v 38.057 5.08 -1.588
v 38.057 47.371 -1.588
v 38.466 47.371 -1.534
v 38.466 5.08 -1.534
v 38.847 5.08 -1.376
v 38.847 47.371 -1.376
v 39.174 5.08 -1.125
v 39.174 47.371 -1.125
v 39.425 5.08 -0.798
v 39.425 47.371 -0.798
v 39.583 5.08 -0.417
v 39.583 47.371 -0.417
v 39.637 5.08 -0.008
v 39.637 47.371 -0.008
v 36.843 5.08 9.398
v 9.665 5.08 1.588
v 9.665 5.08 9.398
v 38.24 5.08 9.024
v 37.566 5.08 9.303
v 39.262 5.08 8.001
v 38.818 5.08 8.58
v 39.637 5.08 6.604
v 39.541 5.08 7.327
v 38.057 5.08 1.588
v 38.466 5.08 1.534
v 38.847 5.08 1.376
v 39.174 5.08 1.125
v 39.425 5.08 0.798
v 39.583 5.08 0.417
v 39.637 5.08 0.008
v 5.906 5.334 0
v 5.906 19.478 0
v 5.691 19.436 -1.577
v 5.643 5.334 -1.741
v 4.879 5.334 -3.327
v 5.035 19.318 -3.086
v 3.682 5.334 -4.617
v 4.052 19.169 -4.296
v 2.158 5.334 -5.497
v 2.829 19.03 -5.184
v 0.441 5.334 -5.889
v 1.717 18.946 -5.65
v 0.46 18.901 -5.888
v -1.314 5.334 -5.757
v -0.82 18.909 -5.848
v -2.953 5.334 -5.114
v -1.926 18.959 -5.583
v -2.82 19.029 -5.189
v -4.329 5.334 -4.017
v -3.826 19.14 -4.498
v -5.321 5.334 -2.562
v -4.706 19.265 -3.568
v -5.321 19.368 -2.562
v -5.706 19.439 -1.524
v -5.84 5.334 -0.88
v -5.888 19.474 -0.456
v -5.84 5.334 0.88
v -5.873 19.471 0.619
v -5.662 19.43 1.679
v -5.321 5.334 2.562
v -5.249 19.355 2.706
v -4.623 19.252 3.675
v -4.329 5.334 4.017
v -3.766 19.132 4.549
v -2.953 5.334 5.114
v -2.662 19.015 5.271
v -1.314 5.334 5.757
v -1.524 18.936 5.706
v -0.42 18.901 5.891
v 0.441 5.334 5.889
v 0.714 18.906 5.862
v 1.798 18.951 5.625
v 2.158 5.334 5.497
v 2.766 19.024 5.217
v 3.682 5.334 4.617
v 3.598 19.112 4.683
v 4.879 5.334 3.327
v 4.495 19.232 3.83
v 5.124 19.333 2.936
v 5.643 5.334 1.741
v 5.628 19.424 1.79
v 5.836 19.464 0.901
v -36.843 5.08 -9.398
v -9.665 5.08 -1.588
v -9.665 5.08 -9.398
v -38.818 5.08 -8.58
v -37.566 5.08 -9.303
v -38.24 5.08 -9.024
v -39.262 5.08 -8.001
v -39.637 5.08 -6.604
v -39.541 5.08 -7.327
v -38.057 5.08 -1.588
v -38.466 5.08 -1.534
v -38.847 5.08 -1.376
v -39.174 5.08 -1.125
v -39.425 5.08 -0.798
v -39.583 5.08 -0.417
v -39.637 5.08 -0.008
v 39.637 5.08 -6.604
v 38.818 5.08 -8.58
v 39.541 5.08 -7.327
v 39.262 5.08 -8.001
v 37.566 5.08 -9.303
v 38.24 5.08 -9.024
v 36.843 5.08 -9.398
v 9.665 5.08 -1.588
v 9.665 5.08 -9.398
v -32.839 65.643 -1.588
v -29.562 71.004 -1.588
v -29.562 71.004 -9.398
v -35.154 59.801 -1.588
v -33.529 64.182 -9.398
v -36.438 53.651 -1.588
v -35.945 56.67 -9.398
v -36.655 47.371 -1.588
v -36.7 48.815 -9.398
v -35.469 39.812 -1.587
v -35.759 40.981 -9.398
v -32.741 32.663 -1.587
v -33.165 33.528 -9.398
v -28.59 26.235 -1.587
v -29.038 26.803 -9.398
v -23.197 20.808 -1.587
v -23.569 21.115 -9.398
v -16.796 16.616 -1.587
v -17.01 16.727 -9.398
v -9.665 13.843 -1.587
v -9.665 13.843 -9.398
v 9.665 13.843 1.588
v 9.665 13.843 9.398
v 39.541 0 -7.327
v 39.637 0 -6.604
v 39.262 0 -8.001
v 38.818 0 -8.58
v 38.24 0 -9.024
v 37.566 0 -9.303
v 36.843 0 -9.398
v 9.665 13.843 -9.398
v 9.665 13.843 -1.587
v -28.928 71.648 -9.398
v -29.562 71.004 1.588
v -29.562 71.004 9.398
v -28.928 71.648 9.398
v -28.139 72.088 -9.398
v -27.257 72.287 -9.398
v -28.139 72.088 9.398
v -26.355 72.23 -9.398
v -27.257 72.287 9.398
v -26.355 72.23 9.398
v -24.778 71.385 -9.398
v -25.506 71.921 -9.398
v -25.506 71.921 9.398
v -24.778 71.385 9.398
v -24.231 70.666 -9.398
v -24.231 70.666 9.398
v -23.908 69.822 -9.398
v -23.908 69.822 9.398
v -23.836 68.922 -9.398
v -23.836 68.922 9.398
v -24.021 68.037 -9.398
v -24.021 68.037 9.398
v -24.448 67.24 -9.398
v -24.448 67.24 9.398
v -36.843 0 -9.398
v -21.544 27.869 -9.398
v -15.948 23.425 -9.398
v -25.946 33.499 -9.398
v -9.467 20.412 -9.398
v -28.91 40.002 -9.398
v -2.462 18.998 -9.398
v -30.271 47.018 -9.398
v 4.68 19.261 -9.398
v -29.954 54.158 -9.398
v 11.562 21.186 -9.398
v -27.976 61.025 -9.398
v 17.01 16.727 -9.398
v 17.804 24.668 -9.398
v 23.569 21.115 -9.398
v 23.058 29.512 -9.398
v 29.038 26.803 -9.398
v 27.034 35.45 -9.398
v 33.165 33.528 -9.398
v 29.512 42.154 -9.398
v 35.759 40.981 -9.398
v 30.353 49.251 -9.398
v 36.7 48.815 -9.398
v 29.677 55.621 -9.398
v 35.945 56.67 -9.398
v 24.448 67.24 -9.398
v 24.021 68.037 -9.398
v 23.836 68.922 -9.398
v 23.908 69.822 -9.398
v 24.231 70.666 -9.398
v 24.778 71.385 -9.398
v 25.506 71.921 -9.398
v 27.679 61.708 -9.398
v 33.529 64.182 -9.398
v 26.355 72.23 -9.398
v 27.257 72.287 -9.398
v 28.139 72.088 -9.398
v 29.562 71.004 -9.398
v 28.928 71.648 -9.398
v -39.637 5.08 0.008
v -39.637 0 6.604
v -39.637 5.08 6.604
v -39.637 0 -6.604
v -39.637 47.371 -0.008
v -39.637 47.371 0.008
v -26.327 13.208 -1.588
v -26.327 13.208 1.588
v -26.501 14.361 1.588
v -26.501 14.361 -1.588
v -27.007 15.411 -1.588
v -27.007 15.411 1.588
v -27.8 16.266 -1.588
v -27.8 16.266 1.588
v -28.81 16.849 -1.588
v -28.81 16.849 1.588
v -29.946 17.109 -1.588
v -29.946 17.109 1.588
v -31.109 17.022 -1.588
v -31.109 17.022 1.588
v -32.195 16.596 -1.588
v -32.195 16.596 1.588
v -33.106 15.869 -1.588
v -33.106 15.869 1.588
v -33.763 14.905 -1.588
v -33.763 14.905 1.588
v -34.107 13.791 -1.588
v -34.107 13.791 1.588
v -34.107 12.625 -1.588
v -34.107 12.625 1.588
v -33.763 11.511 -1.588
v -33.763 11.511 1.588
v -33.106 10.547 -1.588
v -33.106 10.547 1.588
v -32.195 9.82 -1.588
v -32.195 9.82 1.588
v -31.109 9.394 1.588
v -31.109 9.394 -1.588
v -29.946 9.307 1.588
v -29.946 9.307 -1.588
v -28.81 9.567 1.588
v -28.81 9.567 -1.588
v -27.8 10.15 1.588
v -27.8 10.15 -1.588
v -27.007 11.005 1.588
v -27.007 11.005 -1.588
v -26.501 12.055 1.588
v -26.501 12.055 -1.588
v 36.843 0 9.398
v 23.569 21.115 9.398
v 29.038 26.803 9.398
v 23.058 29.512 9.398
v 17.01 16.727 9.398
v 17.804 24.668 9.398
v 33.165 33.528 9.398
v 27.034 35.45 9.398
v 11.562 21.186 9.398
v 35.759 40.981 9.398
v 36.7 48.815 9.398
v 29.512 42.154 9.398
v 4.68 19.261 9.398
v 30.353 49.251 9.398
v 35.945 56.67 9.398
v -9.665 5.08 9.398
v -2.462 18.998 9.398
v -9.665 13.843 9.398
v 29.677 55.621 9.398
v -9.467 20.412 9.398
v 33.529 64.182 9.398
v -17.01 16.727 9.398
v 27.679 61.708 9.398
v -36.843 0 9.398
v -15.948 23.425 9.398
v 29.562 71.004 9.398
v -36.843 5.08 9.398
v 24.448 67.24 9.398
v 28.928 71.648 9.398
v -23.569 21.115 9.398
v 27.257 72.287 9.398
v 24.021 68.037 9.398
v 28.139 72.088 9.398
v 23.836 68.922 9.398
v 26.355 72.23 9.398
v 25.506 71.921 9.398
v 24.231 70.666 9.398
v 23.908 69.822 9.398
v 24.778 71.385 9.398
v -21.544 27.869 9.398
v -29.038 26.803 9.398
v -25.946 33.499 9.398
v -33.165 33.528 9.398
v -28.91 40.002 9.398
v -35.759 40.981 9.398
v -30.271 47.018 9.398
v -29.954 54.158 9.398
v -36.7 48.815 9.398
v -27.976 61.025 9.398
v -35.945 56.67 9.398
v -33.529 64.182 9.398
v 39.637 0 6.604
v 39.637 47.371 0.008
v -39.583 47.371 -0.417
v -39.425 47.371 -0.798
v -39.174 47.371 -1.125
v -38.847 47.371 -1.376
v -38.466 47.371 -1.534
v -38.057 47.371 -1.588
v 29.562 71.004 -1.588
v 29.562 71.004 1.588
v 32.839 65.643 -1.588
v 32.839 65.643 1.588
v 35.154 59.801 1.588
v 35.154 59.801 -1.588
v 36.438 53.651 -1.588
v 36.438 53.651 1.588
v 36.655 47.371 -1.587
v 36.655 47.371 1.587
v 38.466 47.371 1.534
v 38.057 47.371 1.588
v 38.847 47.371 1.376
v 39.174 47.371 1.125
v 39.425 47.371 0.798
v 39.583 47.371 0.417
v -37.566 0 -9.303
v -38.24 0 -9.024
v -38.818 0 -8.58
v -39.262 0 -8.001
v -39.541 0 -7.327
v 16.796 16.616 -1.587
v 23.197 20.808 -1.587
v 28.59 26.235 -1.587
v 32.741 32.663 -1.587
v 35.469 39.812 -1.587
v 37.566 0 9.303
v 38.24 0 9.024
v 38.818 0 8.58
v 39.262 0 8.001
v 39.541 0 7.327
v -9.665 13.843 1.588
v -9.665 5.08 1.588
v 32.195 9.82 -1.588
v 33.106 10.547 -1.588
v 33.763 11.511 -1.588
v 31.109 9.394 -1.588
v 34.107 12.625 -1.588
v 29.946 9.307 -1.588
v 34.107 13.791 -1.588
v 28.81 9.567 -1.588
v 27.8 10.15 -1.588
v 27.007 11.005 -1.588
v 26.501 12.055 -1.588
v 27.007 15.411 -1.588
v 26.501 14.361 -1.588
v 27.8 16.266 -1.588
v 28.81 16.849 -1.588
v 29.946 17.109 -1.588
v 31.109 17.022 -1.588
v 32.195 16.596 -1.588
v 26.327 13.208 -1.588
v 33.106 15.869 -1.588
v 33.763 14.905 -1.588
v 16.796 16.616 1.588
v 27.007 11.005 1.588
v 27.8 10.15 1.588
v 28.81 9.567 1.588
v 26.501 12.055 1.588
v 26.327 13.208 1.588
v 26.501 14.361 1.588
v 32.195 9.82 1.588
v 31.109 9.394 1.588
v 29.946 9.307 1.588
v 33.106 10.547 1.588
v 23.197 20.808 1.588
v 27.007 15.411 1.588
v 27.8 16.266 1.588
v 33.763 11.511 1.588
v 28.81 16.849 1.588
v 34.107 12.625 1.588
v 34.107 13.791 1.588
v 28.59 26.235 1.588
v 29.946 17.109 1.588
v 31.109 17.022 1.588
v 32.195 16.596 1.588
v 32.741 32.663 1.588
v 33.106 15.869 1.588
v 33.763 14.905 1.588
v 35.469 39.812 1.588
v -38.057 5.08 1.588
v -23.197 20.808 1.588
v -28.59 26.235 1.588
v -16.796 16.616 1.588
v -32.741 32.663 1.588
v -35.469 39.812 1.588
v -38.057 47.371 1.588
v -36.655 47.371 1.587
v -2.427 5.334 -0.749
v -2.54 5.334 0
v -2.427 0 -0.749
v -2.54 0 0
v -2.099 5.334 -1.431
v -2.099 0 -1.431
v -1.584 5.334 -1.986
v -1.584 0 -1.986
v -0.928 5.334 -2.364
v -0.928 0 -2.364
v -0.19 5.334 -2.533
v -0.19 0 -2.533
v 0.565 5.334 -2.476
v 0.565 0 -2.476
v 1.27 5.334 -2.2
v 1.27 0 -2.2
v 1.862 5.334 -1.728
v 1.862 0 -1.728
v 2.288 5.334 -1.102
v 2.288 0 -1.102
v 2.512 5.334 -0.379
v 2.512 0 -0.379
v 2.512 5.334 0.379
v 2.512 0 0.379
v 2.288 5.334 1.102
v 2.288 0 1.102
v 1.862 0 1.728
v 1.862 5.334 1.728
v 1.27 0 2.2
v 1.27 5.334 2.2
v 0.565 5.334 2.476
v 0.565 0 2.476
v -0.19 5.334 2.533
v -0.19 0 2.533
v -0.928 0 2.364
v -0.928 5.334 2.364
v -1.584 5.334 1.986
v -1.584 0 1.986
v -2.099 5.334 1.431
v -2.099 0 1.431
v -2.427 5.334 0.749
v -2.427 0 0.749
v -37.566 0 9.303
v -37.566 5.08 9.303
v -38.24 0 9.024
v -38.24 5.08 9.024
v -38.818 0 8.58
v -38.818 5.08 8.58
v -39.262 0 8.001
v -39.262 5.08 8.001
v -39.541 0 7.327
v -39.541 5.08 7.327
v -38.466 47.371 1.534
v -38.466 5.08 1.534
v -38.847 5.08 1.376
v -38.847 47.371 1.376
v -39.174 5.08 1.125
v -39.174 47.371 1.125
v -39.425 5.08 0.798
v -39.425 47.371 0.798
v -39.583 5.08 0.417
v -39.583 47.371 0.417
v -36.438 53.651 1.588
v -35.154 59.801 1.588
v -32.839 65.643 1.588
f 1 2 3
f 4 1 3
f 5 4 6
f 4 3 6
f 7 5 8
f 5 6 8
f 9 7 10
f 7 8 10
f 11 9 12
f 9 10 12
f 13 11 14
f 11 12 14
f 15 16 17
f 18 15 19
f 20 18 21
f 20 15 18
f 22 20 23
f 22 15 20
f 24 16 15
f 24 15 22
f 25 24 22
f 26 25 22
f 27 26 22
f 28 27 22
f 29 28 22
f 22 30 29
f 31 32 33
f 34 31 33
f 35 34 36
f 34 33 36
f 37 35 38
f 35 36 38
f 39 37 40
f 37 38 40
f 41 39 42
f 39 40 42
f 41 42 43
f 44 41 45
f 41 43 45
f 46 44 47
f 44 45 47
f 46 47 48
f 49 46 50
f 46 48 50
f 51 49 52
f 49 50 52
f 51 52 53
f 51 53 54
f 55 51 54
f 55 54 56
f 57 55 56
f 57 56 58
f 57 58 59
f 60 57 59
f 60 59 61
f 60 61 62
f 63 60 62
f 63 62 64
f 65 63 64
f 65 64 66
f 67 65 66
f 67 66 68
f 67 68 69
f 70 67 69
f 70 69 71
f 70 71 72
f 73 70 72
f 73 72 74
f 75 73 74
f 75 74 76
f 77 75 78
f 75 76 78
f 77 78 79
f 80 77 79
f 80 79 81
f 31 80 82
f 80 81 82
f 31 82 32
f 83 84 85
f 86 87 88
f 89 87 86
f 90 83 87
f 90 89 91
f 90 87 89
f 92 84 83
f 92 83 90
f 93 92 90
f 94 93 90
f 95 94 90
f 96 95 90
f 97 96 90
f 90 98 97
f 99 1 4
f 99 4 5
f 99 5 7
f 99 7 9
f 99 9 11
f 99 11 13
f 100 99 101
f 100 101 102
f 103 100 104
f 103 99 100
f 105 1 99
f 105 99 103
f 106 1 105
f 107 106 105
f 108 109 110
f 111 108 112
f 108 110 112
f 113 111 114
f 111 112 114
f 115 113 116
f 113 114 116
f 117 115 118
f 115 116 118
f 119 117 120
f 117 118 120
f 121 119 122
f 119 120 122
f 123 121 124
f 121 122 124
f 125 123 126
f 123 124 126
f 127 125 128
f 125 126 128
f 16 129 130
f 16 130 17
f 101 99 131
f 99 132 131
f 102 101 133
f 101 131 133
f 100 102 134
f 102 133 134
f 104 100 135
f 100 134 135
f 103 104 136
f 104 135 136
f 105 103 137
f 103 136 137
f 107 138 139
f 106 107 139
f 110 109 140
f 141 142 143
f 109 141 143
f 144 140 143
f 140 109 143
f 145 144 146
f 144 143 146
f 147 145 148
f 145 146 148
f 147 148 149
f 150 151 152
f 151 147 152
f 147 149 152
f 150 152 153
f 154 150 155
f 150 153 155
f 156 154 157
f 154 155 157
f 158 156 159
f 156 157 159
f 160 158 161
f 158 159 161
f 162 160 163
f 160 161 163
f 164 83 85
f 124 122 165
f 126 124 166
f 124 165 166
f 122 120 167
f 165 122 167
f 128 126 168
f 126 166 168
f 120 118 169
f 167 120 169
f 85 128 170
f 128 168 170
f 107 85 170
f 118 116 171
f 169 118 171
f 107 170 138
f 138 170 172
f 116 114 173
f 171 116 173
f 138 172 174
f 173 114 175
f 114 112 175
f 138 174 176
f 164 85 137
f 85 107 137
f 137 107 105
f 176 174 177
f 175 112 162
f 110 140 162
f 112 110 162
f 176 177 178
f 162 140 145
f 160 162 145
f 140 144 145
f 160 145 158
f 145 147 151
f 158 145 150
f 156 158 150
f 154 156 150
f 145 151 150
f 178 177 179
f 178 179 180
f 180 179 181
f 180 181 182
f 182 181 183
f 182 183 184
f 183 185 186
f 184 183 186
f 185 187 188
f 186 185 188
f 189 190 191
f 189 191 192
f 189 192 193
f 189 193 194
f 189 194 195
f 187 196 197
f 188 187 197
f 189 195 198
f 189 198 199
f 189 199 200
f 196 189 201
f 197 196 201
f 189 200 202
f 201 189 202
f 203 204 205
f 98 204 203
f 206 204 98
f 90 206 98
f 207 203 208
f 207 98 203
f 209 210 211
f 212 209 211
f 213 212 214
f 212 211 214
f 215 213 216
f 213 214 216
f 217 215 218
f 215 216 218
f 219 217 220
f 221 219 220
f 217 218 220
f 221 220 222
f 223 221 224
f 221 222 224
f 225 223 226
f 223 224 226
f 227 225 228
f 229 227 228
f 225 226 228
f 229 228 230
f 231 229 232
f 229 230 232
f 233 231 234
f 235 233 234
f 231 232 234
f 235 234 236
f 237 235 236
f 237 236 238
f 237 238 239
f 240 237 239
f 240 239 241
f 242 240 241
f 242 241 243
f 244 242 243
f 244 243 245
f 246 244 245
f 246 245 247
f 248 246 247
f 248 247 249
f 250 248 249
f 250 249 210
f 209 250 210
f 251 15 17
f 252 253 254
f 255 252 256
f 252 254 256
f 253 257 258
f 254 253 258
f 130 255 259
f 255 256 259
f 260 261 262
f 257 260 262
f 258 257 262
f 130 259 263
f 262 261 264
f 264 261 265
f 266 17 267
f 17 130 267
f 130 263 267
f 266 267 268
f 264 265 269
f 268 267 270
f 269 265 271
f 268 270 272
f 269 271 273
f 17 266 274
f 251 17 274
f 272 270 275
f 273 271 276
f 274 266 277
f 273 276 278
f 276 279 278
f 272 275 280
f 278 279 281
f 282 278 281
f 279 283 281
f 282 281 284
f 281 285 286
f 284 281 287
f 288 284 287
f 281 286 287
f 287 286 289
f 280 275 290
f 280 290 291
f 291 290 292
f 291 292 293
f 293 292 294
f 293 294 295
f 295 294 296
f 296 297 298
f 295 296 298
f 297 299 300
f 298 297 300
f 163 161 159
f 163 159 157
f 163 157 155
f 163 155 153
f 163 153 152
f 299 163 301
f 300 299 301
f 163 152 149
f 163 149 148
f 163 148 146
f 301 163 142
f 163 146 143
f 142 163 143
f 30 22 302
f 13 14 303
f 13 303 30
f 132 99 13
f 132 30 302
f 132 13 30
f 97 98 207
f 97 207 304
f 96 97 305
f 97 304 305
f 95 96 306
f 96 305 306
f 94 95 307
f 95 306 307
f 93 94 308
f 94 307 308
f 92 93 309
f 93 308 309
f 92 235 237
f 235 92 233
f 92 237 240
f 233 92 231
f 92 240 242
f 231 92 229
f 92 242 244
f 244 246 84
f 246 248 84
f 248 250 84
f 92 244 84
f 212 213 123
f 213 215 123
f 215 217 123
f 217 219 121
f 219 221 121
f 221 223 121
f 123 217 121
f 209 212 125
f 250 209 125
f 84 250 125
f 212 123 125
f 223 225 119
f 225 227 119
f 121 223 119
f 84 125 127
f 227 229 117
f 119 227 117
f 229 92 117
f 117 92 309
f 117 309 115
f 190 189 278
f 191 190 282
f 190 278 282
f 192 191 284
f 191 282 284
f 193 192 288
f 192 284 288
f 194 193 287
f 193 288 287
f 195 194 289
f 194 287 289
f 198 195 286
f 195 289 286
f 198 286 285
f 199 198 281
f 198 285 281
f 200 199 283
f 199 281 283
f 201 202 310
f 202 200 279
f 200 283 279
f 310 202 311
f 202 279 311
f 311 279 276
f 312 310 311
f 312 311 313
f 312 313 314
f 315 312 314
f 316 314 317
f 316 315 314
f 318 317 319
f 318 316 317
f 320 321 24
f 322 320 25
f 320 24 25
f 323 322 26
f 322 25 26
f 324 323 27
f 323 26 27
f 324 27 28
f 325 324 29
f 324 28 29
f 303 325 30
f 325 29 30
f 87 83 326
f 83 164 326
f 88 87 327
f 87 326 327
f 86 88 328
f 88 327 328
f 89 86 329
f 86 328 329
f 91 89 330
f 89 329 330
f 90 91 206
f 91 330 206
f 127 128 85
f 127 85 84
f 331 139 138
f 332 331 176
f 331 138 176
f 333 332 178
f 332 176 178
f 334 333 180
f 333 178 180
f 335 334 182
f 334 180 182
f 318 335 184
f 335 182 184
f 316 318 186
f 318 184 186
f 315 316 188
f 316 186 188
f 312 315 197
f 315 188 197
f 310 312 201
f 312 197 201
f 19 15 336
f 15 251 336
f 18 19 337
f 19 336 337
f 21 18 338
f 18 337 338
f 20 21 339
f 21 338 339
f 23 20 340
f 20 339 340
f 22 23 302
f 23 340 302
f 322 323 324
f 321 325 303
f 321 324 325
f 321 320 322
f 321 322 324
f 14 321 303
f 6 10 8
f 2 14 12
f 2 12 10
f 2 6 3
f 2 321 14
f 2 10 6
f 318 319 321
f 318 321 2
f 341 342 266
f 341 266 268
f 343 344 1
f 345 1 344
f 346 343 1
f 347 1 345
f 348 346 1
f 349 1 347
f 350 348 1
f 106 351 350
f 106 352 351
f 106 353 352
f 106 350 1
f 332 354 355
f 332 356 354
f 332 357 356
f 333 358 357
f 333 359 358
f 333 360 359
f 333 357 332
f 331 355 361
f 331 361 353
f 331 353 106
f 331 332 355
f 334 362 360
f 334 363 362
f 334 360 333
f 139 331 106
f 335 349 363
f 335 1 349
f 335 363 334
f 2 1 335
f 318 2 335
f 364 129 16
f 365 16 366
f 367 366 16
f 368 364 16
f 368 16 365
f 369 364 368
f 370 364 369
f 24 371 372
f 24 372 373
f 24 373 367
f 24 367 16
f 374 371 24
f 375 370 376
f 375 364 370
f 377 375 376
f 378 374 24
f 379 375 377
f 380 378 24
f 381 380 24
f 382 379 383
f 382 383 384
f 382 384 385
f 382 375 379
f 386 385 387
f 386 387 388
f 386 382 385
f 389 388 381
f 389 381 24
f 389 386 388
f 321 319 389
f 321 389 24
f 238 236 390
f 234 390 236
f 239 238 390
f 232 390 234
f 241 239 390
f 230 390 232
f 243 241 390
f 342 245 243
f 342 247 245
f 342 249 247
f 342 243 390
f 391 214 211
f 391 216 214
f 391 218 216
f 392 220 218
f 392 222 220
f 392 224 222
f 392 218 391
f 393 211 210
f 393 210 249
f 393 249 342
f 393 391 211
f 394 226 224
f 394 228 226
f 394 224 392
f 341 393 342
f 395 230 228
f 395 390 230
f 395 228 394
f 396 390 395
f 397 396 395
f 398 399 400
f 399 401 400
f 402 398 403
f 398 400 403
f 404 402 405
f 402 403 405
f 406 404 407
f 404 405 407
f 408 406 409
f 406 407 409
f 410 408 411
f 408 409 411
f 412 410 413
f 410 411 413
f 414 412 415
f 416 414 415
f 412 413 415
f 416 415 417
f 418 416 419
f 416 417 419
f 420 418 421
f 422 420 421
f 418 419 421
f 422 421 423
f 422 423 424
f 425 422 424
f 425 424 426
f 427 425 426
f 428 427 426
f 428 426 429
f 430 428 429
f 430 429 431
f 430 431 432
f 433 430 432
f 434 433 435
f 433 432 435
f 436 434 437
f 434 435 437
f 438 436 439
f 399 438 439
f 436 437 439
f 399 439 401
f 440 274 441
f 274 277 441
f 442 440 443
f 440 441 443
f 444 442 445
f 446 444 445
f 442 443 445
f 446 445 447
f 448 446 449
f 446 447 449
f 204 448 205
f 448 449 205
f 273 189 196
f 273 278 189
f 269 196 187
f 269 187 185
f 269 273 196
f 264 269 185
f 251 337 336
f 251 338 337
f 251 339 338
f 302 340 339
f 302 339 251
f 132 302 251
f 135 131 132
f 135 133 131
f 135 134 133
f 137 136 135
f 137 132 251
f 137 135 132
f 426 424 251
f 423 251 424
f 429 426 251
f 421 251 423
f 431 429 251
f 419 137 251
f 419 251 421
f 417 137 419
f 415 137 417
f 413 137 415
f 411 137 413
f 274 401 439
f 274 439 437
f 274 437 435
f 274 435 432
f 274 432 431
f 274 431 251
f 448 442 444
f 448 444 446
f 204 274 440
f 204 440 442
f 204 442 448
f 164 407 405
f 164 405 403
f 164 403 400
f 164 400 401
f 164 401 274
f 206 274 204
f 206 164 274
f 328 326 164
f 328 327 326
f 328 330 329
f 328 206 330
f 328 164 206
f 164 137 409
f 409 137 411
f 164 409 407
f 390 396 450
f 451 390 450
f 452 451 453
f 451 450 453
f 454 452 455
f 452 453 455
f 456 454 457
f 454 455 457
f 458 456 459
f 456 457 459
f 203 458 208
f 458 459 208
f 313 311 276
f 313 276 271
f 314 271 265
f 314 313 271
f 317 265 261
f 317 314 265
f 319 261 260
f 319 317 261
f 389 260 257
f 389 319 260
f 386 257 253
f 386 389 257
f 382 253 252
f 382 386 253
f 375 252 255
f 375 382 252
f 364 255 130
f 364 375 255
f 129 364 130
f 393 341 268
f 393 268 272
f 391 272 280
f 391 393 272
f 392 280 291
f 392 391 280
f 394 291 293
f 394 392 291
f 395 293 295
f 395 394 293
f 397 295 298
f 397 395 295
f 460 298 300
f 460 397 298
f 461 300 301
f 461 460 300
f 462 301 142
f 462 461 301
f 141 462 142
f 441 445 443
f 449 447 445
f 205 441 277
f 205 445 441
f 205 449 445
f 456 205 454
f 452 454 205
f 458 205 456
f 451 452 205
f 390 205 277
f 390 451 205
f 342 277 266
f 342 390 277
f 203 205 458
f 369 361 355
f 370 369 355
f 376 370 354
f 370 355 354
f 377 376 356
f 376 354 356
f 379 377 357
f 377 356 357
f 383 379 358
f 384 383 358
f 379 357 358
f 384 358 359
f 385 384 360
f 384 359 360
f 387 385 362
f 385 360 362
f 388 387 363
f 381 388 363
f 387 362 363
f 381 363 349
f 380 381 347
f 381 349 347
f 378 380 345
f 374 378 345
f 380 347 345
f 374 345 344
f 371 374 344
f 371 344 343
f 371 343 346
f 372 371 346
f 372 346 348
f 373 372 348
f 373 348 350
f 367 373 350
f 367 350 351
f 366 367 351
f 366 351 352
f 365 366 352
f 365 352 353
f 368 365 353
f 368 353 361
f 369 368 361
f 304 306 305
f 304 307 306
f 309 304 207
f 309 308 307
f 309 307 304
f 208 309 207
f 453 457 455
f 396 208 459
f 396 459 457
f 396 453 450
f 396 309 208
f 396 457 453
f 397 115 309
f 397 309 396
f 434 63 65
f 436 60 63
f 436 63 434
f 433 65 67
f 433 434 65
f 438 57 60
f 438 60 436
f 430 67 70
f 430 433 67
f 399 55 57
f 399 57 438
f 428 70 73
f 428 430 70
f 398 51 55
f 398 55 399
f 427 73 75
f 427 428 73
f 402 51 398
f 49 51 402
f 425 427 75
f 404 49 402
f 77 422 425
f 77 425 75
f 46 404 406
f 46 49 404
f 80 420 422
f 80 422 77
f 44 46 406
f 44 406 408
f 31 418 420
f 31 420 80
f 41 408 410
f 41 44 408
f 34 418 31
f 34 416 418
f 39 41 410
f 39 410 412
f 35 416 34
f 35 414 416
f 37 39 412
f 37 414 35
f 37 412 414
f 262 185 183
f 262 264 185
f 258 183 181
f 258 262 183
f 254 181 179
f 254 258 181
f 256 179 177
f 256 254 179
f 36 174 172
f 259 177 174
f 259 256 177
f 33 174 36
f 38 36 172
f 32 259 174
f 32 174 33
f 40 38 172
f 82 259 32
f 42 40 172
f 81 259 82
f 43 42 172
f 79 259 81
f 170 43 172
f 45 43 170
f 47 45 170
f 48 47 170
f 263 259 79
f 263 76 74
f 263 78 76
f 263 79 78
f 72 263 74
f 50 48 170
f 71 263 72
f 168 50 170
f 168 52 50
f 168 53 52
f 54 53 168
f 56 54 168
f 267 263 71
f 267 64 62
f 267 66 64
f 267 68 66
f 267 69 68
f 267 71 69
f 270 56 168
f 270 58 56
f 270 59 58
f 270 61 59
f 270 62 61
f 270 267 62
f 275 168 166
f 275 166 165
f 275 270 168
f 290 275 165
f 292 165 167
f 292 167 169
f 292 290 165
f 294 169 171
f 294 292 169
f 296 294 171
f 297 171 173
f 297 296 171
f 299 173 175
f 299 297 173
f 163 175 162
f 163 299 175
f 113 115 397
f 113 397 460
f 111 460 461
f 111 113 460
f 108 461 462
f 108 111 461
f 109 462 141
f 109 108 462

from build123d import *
from build123d.topology import SkipClean

# Parameters (mm, degrees)
BOSS_EXTRUDE1_DEPTH      = 3.175
SKETCH2_W                = 73.3096723
SKETCH2_H                = 3.175
BOSS_EXTRUDE2_DEPTH      = 33.528
BOSS_EXTRUDE3_START      = 7.8105
BOSS_EXTRUDE3_DEPTH      = 7.8105
SKETCH4_W                = 3.175
SKETCH4_H                = 33.528
BOSS_EXTRUDE4_DEPTH      = 2.98186385
SKETCH5_W                = 3.175
SKETCH5_H                = 33.528
BOSS_EXTRUDE5_DEPTH      = 2.98186385
SKETCH6_W                = 79.2734
SKETCH6_H                = 10.9855
BOSS_EXTRUDE6_DEPTH      = 13.843
SKETCH7_W                = 29.972
SKETCH7_H                = 7.8105
CUT_EXTRUDE1_DEPTH       = 8.763
SKETCH8_W                = 29.972
SKETCH8_H                = 7.8105
CUT_EXTRUDE2_DEPTH       = 8.763
BOSS_EXTRUDE7_DEPTH      = 7.8105
CUT_EXTRUDE3_DEPTH       = 97.500739167
SKETCH11_W               = 30.353
SKETCH11_H               = 18.796
HOLE1_D                  = 5.08
HOLE1_CBORE_D            = 11.811
HOLE1_CBORE_DEPTH        = 14.143710789
M7_CLEARANCE_HOLE1_D     = 7.8232
M7_CLEARANCE_HOLE1_DEPTH = 10.9855
M7_CLEARANCE_HOLE2_D     = 7.8232
M7_CLEARANCE_HOLE2_DEPTH = 10.9855
FILLET1_R                = 1.57988
FILLET2_R                = 2.794


with BuildPart() as part:
    # Sketch1 → Boss-Extrude1 (new body)
    with BuildSketch(Plane(origin=(0, 0, -1.5875), x_dir=(-1, 0, 0), z_dir=(0, 0, -1))):
        with BuildLine():
            Line((-36.65483615, 47.371), (36.65483615, 47.371))
            ThreePointArc((36.65483615, 47.371), (0, 85.953679717), (-36.65483615, 47.371))
        make_face()
    extrude(amount=-BOSS_EXTRUDE1_DEPTH)

    # Sketch2 → Boss-Extrude2 (add)
    with BuildSketch(Plane.XZ.offset(-47.371)):
        Rectangle(SKETCH2_W, SKETCH2_H)
    extrude(amount=BOSS_EXTRUDE2_DEPTH)

    # Sketch3 → Boss-Extrude3 (add)
    with SkipClean():  # the faces are left unmerged after this step: merging them gives an invalid solid
        with BuildSketch(Plane(origin=(0, 0, -1.5875), x_dir=(-1, 0, 0), z_dir=(0, 0, -1)).offset(BOSS_EXTRUDE3_START)):
            with BuildLine():
                Line((9.6647, 13.843), (-9.6647, 13.843))
                ThreePointArc((-9.6647, 13.843), (0, 85.953679717), (9.6647, 13.843))
            make_face()
        extrude(amount=-BOSS_EXTRUDE3_DEPTH)

    # Sketch4 → Boss-Extrude4 (add)
    with SkipClean():  # the faces are left unmerged after this step: merging them gives an invalid solid
        with BuildSketch(Plane.ZY.offset(36.65483615)):
            with Locations((0, 30.607)):
                Rectangle(SKETCH4_W, SKETCH4_H)
        extrude(amount=BOSS_EXTRUDE4_DEPTH)

    # Sketch5 → Boss-Extrude5 (add)
    with SkipClean():  # the faces are left unmerged after this step: merging them gives an invalid solid
        with BuildSketch(Plane(origin=(36.65483615, 0, 0), x_dir=(0, 0, -1), z_dir=(1, 0, 0))):
            with Locations((0, 30.607)):
                Rectangle(SKETCH5_W, SKETCH5_H)
        extrude(amount=BOSS_EXTRUDE5_DEPTH)

    # Sketch6 → Boss-Extrude6 (add)
    with SkipClean():  # the faces are left unmerged after this step: merging them gives an invalid solid
        with BuildSketch(Plane.XZ.offset(-13.843)):
            with Locations((0, -3.90525)):
                Rectangle(SKETCH6_W, SKETCH6_H)
        extrude(amount=BOSS_EXTRUDE6_DEPTH)

    # Sketch7 → Cut-Extrude1 (cut)
    with SkipClean():  # the faces are left unmerged after this step: merging them gives an invalid solid
        with BuildSketch(Plane(origin=(0, 13.843, 0), x_dir=(-1, 0, 0), z_dir=(0, 1, 0))):
            with Locations((-24.6507, -5.49275)):
                Rectangle(SKETCH7_W, SKETCH7_H)
        extrude(amount=-CUT_EXTRUDE1_DEPTH, mode=Mode.SUBTRACT)

    # Sketch8 → Cut-Extrude2 (cut)
    with SkipClean():  # the faces are left unmerged after this step: merging them gives an invalid solid
        with BuildSketch(Plane(origin=(0, 13.843, 0), x_dir=(-1, 0, 0), z_dir=(0, 1, 0))):
            with Locations((24.6507, -5.49275)):
                Rectangle(SKETCH8_W, SKETCH8_H)
        extrude(amount=-CUT_EXTRUDE2_DEPTH, mode=Mode.SUBTRACT)

    # Sketch9 → Boss-Extrude7 (add)
    with SkipClean():  # the faces are left unmerged after this step: merging them gives an invalid solid
        with BuildSketch(Plane.XY.offset(1.5875)):
            with BuildLine():
                Line((9.6647, 13.843), (9.6647, 5.08))
                Line((9.6647, 5.08), (39.6367, 5.08))
                Line((39.6367, 5.08), (39.6367, 0))
                Line((39.6367, 0), (-39.6367, 0))
                Line((-39.6367, 0), (-39.6367, 5.08))
                Line((-39.6367, 5.08), (-9.6647, 5.08))
                Line((-9.6647, 5.08), (-9.6647, 13.843))
                ThreePointArc((-9.6647, 13.843), (0, 85.953679717), (9.6647, 13.843))
            make_face()
        extrude(amount=BOSS_EXTRUDE7_DEPTH)

    # Sketch10 → Cut-Extrude3 (cut, through all)
    with SkipClean():  # the faces are left unmerged after this step: merging them gives an invalid solid
        with BuildSketch(Plane.XY.offset(9.398)):
            with BuildLine():
                ThreePointArc((-29.562039749, 71.003748808), (-25.123016493, 71.679265301), (-24.4475, 67.240242044))
                ThreePointArc((-24.4475, 67.240242044), (0, 79.603679717), (24.4475, 67.240242044))
                ThreePointArc((24.4475, 67.240242044), (25.123016493, 71.679265301), (29.562039749, 71.003748808))
                ThreePointArc((29.562039749, 71.003748808), (0, 85.953679717), (-29.562039749, 71.003748808))
            make_face()
        extrude(amount=-CUT_EXTRUDE3_DEPTH, mode=Mode.SUBTRACT)

    # Sketch11 → Cut-Revolve1 (revolve, cut)
    with SkipClean():  # the faces are left unmerged after this step: merging them gives an invalid solid
        with BuildSketch(Plane.XZ.offset(-49.250679717)):
            with Locations((15.1765, 0)):
                Rectangle(SKETCH11_W, SKETCH11_H)
        revolve(axis=Axis((0, 49.250679717, 9.398), (0, 0, -1)), mode=Mode.SUBTRACT)

    # Hole1 (through all)
    with Locations(Plane(origin=(0, 19.477710789, 0), x_dir=(1, 0, 0), z_dir=(0, 1, 0))):
        with Locations((0, 0)):
            CounterBoreHole(HOLE1_D / 2, HOLE1_CBORE_D / 2, HOLE1_CBORE_DEPTH)

    # M7 Clearance Hole1
    with Locations(Plane(origin=(0, 0, -1.5875), x_dir=(-1, 0, 0), z_dir=(0, 0, -1))):
        with Locations((30.2387, 13.208)):
            Hole(M7_CLEARANCE_HOLE1_D / 2, depth=M7_CLEARANCE_HOLE1_DEPTH)

    # M7 Clearance Hole2
    with Locations(Plane.XY.offset(1.5875)):
        with Locations((30.2387, 13.208)):
            Hole(M7_CLEARANCE_HOLE2_D / 2, depth=M7_CLEARANCE_HOLE2_DEPTH)

    # Fillet1
    # the kernel refuses this fillet: 1.57988 mm, written as the material it takes off along each edge
    with BuildSketch(Plane(origin=(-39.6367, 13.843, -1.5875), x_dir=(1, 0, 0), z_dir=(0, 1, 0)), Plane(origin=(39.6367, 51.3207, -1.5875), x_dir=(-1, 0, 0), z_dir=(0, -1, 0)), Plane(origin=(-39.6367, 51.3207, 1.5875), x_dir=(1, 0, 0), z_dir=(0, -1, 0))) as fillet1_piece_1:
        with BuildLine():
            CenterArc((FILLET1_R, -FILLET1_R), FILLET1_R, 90, 90)
            Line((0, -FILLET1_R), (0, 0))
            Line((0, 0), (FILLET1_R, 0))
        make_face()
    extrude(amount=37.4777, mode=Mode.SUBTRACT)
    with BuildSketch(Plane(origin=(39.6367, 13.843, 1.5875), x_dir=(0, 0, -1), z_dir=(0, 1, 0))) as fillet1_piece_2:
        with BuildLine():
            CenterArc((FILLET1_R, FILLET1_R), FILLET1_R, 180, 90)
            Line((0, FILLET1_R), (0, 0))
            Line((0, 0), (FILLET1_R, 0))
        make_face()
    extrude(amount=37.4777, mode=Mode.SUBTRACT)
    with BuildSketch(Plane(origin=(-39.6367, 13.843, 1.5875), x_dir=(1, 0, 0), z_dir=(0, -1, 0)), Plane(origin=(39.6367, 13.843, 1.5875), x_dir=(0, 0, -1), z_dir=(0, -1, 0))) as fillet1_piece_3:
        with BuildLine():
            CenterArc((FILLET1_R, -FILLET1_R), FILLET1_R, 90, 90)
            Line((0, -FILLET1_R), (0, 0))
            Line((0, 0), (FILLET1_R, 0))
        make_face()
    extrude(amount=8.763, mode=Mode.SUBTRACT)
    with BuildSketch(Plane(origin=(39.6367, 13.843, -1.5875), x_dir=(0, 0, 1), z_dir=(0, -1, 0)), Plane(origin=(-39.6367, 13.843, -1.5875), x_dir=(1, 0, 0), z_dir=(0, -1, 0))) as fillet1_piece_4:
        with BuildLine():
            CenterArc((FILLET1_R, FILLET1_R), FILLET1_R, 180, 90)
            Line((0, FILLET1_R), (0, 0))
            Line((0, 0), (FILLET1_R, 0))
        make_face()
    extrude(amount=8.763, mode=Mode.SUBTRACT)

    # Fillet2
    fillet2_edges = [part.edges().sort_by_distance(p)[0] for p in [
        (-39.6367, 2.54, 9.398),
        (39.6367, 2.54, 9.398),
        (-39.6367, 2.54, -9.398),
        (39.6367, 2.54, -9.398),
    ]]
    fillet(fillet2_edges, radius=FILLET2_R)


solid = part.part
